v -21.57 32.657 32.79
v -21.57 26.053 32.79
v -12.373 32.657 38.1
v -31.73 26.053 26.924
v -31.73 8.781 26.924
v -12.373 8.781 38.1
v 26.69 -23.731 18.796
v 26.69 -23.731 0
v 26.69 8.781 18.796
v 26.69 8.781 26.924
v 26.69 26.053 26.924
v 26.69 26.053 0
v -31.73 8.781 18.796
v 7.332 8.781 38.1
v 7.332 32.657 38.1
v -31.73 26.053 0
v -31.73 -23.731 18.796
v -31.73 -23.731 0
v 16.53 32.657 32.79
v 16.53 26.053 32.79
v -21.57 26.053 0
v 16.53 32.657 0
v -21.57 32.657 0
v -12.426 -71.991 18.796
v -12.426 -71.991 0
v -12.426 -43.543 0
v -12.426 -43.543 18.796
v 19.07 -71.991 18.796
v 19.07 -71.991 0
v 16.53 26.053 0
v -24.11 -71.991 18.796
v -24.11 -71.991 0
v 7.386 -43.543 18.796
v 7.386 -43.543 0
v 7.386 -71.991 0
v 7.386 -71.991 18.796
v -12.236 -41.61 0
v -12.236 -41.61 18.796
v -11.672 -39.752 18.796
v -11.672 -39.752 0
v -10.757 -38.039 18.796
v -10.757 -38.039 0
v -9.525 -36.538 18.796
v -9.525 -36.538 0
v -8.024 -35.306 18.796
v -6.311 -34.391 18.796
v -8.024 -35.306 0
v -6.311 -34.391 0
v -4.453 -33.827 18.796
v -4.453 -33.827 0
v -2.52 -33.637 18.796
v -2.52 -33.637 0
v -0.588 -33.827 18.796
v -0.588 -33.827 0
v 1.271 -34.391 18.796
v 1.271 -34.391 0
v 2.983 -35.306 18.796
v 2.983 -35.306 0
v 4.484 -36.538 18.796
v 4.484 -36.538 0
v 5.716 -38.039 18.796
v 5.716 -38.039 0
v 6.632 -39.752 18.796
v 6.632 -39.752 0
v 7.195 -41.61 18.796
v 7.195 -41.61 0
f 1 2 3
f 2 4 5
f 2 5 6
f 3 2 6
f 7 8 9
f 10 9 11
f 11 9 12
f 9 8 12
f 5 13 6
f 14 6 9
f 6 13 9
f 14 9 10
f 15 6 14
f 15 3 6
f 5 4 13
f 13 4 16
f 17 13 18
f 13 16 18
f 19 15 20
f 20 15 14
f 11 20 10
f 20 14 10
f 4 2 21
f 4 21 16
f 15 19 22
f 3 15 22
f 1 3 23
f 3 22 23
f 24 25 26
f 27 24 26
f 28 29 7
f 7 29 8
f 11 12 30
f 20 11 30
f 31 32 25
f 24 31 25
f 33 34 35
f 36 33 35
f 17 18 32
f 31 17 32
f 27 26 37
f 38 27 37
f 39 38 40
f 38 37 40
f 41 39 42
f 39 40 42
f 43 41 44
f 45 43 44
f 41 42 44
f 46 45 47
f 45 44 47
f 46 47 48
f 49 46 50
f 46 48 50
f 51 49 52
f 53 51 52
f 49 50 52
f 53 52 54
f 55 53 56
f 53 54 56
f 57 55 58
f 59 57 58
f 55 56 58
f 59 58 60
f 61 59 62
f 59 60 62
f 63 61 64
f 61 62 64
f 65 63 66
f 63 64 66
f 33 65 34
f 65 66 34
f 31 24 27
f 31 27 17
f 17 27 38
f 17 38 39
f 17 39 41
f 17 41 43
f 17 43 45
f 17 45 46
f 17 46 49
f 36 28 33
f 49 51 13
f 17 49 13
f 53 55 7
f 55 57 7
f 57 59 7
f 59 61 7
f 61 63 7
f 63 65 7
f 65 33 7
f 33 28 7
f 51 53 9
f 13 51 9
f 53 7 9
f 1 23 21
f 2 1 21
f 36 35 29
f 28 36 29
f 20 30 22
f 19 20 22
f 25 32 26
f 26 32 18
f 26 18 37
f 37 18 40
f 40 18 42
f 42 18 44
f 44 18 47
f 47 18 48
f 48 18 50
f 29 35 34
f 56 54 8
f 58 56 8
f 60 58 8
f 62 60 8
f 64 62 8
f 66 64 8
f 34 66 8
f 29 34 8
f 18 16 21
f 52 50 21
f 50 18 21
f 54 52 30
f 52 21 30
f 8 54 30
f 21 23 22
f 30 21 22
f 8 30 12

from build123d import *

# Parameters (mm, degrees)
F1_DEPTH = 38.1
F2_W     = 135.403224
F2_H     = 41.598107
F3_DEPTH = 50.8
F5_DEPTH = 101.6


with BuildPart() as f1:
    # F0 (on Top) → F1 (new body)
    with BuildSketch(Plane.XY):
        with BuildLine():
            Line((16.529732, 26.053323), (16.529732, 32.657323))
            Line((16.529732, 32.657323), (-21.570268, 32.657323))
            Line((-21.570268, 32.657323), (-21.570268, 26.053323))
            Line((-21.570268, 26.053323), (-31.730268, 26.053323))
            Line((-31.730268, 26.053323), (-31.730268, -23.730677))
            Line((-31.730268, -23.730677), (-24.110268, -71.990677))
            Line((-24.110268, -71.990677), (-12.426268, -71.990677))
            Line((-12.426268, -71.990677), (-12.426268, -43.542677))
            ThreePointArc((-12.426268, -43.542677), (-2.520268, -33.636677), (7.385732, -43.542677))
            Line((7.385732, -43.542677), (7.385732, -71.990677))
            Line((7.385732, -71.990677), (19.069732, -71.990677))
            Line((19.069732, -71.990677), (26.689732, -23.730677))
            Line((26.689732, -23.730677), (26.689732, 26.053323))
            Line((26.689732, 26.053323), (16.529732, 26.053323))
        make_face()
    extrude(amount=F1_DEPTH)

    # F2 (on Right) → F3 (cut, symmetric)
    with BuildSketch(Plane.YZ):
        with Locations((-58.920289, 39.595053)):
            Rectangle(F2_W, F2_H)
    extrude(amount=F3_DEPTH, both=True, mode=Mode.SUBTRACT)

    # F4 (on Front) → F5 (cut)
    with BuildSketch(Plane.XZ):
        Polygon((26.689732, 26.924), (26.689732, 38.1), (7.332333, 38.1), align=None)
        Polygon((-31.730268, 26.924), (-12.372868, 38.1), (-31.730268, 38.1), align=None)
    extrude(amount=-F5_DEPTH, mode=Mode.SUBTRACT)


solid = f1.part
